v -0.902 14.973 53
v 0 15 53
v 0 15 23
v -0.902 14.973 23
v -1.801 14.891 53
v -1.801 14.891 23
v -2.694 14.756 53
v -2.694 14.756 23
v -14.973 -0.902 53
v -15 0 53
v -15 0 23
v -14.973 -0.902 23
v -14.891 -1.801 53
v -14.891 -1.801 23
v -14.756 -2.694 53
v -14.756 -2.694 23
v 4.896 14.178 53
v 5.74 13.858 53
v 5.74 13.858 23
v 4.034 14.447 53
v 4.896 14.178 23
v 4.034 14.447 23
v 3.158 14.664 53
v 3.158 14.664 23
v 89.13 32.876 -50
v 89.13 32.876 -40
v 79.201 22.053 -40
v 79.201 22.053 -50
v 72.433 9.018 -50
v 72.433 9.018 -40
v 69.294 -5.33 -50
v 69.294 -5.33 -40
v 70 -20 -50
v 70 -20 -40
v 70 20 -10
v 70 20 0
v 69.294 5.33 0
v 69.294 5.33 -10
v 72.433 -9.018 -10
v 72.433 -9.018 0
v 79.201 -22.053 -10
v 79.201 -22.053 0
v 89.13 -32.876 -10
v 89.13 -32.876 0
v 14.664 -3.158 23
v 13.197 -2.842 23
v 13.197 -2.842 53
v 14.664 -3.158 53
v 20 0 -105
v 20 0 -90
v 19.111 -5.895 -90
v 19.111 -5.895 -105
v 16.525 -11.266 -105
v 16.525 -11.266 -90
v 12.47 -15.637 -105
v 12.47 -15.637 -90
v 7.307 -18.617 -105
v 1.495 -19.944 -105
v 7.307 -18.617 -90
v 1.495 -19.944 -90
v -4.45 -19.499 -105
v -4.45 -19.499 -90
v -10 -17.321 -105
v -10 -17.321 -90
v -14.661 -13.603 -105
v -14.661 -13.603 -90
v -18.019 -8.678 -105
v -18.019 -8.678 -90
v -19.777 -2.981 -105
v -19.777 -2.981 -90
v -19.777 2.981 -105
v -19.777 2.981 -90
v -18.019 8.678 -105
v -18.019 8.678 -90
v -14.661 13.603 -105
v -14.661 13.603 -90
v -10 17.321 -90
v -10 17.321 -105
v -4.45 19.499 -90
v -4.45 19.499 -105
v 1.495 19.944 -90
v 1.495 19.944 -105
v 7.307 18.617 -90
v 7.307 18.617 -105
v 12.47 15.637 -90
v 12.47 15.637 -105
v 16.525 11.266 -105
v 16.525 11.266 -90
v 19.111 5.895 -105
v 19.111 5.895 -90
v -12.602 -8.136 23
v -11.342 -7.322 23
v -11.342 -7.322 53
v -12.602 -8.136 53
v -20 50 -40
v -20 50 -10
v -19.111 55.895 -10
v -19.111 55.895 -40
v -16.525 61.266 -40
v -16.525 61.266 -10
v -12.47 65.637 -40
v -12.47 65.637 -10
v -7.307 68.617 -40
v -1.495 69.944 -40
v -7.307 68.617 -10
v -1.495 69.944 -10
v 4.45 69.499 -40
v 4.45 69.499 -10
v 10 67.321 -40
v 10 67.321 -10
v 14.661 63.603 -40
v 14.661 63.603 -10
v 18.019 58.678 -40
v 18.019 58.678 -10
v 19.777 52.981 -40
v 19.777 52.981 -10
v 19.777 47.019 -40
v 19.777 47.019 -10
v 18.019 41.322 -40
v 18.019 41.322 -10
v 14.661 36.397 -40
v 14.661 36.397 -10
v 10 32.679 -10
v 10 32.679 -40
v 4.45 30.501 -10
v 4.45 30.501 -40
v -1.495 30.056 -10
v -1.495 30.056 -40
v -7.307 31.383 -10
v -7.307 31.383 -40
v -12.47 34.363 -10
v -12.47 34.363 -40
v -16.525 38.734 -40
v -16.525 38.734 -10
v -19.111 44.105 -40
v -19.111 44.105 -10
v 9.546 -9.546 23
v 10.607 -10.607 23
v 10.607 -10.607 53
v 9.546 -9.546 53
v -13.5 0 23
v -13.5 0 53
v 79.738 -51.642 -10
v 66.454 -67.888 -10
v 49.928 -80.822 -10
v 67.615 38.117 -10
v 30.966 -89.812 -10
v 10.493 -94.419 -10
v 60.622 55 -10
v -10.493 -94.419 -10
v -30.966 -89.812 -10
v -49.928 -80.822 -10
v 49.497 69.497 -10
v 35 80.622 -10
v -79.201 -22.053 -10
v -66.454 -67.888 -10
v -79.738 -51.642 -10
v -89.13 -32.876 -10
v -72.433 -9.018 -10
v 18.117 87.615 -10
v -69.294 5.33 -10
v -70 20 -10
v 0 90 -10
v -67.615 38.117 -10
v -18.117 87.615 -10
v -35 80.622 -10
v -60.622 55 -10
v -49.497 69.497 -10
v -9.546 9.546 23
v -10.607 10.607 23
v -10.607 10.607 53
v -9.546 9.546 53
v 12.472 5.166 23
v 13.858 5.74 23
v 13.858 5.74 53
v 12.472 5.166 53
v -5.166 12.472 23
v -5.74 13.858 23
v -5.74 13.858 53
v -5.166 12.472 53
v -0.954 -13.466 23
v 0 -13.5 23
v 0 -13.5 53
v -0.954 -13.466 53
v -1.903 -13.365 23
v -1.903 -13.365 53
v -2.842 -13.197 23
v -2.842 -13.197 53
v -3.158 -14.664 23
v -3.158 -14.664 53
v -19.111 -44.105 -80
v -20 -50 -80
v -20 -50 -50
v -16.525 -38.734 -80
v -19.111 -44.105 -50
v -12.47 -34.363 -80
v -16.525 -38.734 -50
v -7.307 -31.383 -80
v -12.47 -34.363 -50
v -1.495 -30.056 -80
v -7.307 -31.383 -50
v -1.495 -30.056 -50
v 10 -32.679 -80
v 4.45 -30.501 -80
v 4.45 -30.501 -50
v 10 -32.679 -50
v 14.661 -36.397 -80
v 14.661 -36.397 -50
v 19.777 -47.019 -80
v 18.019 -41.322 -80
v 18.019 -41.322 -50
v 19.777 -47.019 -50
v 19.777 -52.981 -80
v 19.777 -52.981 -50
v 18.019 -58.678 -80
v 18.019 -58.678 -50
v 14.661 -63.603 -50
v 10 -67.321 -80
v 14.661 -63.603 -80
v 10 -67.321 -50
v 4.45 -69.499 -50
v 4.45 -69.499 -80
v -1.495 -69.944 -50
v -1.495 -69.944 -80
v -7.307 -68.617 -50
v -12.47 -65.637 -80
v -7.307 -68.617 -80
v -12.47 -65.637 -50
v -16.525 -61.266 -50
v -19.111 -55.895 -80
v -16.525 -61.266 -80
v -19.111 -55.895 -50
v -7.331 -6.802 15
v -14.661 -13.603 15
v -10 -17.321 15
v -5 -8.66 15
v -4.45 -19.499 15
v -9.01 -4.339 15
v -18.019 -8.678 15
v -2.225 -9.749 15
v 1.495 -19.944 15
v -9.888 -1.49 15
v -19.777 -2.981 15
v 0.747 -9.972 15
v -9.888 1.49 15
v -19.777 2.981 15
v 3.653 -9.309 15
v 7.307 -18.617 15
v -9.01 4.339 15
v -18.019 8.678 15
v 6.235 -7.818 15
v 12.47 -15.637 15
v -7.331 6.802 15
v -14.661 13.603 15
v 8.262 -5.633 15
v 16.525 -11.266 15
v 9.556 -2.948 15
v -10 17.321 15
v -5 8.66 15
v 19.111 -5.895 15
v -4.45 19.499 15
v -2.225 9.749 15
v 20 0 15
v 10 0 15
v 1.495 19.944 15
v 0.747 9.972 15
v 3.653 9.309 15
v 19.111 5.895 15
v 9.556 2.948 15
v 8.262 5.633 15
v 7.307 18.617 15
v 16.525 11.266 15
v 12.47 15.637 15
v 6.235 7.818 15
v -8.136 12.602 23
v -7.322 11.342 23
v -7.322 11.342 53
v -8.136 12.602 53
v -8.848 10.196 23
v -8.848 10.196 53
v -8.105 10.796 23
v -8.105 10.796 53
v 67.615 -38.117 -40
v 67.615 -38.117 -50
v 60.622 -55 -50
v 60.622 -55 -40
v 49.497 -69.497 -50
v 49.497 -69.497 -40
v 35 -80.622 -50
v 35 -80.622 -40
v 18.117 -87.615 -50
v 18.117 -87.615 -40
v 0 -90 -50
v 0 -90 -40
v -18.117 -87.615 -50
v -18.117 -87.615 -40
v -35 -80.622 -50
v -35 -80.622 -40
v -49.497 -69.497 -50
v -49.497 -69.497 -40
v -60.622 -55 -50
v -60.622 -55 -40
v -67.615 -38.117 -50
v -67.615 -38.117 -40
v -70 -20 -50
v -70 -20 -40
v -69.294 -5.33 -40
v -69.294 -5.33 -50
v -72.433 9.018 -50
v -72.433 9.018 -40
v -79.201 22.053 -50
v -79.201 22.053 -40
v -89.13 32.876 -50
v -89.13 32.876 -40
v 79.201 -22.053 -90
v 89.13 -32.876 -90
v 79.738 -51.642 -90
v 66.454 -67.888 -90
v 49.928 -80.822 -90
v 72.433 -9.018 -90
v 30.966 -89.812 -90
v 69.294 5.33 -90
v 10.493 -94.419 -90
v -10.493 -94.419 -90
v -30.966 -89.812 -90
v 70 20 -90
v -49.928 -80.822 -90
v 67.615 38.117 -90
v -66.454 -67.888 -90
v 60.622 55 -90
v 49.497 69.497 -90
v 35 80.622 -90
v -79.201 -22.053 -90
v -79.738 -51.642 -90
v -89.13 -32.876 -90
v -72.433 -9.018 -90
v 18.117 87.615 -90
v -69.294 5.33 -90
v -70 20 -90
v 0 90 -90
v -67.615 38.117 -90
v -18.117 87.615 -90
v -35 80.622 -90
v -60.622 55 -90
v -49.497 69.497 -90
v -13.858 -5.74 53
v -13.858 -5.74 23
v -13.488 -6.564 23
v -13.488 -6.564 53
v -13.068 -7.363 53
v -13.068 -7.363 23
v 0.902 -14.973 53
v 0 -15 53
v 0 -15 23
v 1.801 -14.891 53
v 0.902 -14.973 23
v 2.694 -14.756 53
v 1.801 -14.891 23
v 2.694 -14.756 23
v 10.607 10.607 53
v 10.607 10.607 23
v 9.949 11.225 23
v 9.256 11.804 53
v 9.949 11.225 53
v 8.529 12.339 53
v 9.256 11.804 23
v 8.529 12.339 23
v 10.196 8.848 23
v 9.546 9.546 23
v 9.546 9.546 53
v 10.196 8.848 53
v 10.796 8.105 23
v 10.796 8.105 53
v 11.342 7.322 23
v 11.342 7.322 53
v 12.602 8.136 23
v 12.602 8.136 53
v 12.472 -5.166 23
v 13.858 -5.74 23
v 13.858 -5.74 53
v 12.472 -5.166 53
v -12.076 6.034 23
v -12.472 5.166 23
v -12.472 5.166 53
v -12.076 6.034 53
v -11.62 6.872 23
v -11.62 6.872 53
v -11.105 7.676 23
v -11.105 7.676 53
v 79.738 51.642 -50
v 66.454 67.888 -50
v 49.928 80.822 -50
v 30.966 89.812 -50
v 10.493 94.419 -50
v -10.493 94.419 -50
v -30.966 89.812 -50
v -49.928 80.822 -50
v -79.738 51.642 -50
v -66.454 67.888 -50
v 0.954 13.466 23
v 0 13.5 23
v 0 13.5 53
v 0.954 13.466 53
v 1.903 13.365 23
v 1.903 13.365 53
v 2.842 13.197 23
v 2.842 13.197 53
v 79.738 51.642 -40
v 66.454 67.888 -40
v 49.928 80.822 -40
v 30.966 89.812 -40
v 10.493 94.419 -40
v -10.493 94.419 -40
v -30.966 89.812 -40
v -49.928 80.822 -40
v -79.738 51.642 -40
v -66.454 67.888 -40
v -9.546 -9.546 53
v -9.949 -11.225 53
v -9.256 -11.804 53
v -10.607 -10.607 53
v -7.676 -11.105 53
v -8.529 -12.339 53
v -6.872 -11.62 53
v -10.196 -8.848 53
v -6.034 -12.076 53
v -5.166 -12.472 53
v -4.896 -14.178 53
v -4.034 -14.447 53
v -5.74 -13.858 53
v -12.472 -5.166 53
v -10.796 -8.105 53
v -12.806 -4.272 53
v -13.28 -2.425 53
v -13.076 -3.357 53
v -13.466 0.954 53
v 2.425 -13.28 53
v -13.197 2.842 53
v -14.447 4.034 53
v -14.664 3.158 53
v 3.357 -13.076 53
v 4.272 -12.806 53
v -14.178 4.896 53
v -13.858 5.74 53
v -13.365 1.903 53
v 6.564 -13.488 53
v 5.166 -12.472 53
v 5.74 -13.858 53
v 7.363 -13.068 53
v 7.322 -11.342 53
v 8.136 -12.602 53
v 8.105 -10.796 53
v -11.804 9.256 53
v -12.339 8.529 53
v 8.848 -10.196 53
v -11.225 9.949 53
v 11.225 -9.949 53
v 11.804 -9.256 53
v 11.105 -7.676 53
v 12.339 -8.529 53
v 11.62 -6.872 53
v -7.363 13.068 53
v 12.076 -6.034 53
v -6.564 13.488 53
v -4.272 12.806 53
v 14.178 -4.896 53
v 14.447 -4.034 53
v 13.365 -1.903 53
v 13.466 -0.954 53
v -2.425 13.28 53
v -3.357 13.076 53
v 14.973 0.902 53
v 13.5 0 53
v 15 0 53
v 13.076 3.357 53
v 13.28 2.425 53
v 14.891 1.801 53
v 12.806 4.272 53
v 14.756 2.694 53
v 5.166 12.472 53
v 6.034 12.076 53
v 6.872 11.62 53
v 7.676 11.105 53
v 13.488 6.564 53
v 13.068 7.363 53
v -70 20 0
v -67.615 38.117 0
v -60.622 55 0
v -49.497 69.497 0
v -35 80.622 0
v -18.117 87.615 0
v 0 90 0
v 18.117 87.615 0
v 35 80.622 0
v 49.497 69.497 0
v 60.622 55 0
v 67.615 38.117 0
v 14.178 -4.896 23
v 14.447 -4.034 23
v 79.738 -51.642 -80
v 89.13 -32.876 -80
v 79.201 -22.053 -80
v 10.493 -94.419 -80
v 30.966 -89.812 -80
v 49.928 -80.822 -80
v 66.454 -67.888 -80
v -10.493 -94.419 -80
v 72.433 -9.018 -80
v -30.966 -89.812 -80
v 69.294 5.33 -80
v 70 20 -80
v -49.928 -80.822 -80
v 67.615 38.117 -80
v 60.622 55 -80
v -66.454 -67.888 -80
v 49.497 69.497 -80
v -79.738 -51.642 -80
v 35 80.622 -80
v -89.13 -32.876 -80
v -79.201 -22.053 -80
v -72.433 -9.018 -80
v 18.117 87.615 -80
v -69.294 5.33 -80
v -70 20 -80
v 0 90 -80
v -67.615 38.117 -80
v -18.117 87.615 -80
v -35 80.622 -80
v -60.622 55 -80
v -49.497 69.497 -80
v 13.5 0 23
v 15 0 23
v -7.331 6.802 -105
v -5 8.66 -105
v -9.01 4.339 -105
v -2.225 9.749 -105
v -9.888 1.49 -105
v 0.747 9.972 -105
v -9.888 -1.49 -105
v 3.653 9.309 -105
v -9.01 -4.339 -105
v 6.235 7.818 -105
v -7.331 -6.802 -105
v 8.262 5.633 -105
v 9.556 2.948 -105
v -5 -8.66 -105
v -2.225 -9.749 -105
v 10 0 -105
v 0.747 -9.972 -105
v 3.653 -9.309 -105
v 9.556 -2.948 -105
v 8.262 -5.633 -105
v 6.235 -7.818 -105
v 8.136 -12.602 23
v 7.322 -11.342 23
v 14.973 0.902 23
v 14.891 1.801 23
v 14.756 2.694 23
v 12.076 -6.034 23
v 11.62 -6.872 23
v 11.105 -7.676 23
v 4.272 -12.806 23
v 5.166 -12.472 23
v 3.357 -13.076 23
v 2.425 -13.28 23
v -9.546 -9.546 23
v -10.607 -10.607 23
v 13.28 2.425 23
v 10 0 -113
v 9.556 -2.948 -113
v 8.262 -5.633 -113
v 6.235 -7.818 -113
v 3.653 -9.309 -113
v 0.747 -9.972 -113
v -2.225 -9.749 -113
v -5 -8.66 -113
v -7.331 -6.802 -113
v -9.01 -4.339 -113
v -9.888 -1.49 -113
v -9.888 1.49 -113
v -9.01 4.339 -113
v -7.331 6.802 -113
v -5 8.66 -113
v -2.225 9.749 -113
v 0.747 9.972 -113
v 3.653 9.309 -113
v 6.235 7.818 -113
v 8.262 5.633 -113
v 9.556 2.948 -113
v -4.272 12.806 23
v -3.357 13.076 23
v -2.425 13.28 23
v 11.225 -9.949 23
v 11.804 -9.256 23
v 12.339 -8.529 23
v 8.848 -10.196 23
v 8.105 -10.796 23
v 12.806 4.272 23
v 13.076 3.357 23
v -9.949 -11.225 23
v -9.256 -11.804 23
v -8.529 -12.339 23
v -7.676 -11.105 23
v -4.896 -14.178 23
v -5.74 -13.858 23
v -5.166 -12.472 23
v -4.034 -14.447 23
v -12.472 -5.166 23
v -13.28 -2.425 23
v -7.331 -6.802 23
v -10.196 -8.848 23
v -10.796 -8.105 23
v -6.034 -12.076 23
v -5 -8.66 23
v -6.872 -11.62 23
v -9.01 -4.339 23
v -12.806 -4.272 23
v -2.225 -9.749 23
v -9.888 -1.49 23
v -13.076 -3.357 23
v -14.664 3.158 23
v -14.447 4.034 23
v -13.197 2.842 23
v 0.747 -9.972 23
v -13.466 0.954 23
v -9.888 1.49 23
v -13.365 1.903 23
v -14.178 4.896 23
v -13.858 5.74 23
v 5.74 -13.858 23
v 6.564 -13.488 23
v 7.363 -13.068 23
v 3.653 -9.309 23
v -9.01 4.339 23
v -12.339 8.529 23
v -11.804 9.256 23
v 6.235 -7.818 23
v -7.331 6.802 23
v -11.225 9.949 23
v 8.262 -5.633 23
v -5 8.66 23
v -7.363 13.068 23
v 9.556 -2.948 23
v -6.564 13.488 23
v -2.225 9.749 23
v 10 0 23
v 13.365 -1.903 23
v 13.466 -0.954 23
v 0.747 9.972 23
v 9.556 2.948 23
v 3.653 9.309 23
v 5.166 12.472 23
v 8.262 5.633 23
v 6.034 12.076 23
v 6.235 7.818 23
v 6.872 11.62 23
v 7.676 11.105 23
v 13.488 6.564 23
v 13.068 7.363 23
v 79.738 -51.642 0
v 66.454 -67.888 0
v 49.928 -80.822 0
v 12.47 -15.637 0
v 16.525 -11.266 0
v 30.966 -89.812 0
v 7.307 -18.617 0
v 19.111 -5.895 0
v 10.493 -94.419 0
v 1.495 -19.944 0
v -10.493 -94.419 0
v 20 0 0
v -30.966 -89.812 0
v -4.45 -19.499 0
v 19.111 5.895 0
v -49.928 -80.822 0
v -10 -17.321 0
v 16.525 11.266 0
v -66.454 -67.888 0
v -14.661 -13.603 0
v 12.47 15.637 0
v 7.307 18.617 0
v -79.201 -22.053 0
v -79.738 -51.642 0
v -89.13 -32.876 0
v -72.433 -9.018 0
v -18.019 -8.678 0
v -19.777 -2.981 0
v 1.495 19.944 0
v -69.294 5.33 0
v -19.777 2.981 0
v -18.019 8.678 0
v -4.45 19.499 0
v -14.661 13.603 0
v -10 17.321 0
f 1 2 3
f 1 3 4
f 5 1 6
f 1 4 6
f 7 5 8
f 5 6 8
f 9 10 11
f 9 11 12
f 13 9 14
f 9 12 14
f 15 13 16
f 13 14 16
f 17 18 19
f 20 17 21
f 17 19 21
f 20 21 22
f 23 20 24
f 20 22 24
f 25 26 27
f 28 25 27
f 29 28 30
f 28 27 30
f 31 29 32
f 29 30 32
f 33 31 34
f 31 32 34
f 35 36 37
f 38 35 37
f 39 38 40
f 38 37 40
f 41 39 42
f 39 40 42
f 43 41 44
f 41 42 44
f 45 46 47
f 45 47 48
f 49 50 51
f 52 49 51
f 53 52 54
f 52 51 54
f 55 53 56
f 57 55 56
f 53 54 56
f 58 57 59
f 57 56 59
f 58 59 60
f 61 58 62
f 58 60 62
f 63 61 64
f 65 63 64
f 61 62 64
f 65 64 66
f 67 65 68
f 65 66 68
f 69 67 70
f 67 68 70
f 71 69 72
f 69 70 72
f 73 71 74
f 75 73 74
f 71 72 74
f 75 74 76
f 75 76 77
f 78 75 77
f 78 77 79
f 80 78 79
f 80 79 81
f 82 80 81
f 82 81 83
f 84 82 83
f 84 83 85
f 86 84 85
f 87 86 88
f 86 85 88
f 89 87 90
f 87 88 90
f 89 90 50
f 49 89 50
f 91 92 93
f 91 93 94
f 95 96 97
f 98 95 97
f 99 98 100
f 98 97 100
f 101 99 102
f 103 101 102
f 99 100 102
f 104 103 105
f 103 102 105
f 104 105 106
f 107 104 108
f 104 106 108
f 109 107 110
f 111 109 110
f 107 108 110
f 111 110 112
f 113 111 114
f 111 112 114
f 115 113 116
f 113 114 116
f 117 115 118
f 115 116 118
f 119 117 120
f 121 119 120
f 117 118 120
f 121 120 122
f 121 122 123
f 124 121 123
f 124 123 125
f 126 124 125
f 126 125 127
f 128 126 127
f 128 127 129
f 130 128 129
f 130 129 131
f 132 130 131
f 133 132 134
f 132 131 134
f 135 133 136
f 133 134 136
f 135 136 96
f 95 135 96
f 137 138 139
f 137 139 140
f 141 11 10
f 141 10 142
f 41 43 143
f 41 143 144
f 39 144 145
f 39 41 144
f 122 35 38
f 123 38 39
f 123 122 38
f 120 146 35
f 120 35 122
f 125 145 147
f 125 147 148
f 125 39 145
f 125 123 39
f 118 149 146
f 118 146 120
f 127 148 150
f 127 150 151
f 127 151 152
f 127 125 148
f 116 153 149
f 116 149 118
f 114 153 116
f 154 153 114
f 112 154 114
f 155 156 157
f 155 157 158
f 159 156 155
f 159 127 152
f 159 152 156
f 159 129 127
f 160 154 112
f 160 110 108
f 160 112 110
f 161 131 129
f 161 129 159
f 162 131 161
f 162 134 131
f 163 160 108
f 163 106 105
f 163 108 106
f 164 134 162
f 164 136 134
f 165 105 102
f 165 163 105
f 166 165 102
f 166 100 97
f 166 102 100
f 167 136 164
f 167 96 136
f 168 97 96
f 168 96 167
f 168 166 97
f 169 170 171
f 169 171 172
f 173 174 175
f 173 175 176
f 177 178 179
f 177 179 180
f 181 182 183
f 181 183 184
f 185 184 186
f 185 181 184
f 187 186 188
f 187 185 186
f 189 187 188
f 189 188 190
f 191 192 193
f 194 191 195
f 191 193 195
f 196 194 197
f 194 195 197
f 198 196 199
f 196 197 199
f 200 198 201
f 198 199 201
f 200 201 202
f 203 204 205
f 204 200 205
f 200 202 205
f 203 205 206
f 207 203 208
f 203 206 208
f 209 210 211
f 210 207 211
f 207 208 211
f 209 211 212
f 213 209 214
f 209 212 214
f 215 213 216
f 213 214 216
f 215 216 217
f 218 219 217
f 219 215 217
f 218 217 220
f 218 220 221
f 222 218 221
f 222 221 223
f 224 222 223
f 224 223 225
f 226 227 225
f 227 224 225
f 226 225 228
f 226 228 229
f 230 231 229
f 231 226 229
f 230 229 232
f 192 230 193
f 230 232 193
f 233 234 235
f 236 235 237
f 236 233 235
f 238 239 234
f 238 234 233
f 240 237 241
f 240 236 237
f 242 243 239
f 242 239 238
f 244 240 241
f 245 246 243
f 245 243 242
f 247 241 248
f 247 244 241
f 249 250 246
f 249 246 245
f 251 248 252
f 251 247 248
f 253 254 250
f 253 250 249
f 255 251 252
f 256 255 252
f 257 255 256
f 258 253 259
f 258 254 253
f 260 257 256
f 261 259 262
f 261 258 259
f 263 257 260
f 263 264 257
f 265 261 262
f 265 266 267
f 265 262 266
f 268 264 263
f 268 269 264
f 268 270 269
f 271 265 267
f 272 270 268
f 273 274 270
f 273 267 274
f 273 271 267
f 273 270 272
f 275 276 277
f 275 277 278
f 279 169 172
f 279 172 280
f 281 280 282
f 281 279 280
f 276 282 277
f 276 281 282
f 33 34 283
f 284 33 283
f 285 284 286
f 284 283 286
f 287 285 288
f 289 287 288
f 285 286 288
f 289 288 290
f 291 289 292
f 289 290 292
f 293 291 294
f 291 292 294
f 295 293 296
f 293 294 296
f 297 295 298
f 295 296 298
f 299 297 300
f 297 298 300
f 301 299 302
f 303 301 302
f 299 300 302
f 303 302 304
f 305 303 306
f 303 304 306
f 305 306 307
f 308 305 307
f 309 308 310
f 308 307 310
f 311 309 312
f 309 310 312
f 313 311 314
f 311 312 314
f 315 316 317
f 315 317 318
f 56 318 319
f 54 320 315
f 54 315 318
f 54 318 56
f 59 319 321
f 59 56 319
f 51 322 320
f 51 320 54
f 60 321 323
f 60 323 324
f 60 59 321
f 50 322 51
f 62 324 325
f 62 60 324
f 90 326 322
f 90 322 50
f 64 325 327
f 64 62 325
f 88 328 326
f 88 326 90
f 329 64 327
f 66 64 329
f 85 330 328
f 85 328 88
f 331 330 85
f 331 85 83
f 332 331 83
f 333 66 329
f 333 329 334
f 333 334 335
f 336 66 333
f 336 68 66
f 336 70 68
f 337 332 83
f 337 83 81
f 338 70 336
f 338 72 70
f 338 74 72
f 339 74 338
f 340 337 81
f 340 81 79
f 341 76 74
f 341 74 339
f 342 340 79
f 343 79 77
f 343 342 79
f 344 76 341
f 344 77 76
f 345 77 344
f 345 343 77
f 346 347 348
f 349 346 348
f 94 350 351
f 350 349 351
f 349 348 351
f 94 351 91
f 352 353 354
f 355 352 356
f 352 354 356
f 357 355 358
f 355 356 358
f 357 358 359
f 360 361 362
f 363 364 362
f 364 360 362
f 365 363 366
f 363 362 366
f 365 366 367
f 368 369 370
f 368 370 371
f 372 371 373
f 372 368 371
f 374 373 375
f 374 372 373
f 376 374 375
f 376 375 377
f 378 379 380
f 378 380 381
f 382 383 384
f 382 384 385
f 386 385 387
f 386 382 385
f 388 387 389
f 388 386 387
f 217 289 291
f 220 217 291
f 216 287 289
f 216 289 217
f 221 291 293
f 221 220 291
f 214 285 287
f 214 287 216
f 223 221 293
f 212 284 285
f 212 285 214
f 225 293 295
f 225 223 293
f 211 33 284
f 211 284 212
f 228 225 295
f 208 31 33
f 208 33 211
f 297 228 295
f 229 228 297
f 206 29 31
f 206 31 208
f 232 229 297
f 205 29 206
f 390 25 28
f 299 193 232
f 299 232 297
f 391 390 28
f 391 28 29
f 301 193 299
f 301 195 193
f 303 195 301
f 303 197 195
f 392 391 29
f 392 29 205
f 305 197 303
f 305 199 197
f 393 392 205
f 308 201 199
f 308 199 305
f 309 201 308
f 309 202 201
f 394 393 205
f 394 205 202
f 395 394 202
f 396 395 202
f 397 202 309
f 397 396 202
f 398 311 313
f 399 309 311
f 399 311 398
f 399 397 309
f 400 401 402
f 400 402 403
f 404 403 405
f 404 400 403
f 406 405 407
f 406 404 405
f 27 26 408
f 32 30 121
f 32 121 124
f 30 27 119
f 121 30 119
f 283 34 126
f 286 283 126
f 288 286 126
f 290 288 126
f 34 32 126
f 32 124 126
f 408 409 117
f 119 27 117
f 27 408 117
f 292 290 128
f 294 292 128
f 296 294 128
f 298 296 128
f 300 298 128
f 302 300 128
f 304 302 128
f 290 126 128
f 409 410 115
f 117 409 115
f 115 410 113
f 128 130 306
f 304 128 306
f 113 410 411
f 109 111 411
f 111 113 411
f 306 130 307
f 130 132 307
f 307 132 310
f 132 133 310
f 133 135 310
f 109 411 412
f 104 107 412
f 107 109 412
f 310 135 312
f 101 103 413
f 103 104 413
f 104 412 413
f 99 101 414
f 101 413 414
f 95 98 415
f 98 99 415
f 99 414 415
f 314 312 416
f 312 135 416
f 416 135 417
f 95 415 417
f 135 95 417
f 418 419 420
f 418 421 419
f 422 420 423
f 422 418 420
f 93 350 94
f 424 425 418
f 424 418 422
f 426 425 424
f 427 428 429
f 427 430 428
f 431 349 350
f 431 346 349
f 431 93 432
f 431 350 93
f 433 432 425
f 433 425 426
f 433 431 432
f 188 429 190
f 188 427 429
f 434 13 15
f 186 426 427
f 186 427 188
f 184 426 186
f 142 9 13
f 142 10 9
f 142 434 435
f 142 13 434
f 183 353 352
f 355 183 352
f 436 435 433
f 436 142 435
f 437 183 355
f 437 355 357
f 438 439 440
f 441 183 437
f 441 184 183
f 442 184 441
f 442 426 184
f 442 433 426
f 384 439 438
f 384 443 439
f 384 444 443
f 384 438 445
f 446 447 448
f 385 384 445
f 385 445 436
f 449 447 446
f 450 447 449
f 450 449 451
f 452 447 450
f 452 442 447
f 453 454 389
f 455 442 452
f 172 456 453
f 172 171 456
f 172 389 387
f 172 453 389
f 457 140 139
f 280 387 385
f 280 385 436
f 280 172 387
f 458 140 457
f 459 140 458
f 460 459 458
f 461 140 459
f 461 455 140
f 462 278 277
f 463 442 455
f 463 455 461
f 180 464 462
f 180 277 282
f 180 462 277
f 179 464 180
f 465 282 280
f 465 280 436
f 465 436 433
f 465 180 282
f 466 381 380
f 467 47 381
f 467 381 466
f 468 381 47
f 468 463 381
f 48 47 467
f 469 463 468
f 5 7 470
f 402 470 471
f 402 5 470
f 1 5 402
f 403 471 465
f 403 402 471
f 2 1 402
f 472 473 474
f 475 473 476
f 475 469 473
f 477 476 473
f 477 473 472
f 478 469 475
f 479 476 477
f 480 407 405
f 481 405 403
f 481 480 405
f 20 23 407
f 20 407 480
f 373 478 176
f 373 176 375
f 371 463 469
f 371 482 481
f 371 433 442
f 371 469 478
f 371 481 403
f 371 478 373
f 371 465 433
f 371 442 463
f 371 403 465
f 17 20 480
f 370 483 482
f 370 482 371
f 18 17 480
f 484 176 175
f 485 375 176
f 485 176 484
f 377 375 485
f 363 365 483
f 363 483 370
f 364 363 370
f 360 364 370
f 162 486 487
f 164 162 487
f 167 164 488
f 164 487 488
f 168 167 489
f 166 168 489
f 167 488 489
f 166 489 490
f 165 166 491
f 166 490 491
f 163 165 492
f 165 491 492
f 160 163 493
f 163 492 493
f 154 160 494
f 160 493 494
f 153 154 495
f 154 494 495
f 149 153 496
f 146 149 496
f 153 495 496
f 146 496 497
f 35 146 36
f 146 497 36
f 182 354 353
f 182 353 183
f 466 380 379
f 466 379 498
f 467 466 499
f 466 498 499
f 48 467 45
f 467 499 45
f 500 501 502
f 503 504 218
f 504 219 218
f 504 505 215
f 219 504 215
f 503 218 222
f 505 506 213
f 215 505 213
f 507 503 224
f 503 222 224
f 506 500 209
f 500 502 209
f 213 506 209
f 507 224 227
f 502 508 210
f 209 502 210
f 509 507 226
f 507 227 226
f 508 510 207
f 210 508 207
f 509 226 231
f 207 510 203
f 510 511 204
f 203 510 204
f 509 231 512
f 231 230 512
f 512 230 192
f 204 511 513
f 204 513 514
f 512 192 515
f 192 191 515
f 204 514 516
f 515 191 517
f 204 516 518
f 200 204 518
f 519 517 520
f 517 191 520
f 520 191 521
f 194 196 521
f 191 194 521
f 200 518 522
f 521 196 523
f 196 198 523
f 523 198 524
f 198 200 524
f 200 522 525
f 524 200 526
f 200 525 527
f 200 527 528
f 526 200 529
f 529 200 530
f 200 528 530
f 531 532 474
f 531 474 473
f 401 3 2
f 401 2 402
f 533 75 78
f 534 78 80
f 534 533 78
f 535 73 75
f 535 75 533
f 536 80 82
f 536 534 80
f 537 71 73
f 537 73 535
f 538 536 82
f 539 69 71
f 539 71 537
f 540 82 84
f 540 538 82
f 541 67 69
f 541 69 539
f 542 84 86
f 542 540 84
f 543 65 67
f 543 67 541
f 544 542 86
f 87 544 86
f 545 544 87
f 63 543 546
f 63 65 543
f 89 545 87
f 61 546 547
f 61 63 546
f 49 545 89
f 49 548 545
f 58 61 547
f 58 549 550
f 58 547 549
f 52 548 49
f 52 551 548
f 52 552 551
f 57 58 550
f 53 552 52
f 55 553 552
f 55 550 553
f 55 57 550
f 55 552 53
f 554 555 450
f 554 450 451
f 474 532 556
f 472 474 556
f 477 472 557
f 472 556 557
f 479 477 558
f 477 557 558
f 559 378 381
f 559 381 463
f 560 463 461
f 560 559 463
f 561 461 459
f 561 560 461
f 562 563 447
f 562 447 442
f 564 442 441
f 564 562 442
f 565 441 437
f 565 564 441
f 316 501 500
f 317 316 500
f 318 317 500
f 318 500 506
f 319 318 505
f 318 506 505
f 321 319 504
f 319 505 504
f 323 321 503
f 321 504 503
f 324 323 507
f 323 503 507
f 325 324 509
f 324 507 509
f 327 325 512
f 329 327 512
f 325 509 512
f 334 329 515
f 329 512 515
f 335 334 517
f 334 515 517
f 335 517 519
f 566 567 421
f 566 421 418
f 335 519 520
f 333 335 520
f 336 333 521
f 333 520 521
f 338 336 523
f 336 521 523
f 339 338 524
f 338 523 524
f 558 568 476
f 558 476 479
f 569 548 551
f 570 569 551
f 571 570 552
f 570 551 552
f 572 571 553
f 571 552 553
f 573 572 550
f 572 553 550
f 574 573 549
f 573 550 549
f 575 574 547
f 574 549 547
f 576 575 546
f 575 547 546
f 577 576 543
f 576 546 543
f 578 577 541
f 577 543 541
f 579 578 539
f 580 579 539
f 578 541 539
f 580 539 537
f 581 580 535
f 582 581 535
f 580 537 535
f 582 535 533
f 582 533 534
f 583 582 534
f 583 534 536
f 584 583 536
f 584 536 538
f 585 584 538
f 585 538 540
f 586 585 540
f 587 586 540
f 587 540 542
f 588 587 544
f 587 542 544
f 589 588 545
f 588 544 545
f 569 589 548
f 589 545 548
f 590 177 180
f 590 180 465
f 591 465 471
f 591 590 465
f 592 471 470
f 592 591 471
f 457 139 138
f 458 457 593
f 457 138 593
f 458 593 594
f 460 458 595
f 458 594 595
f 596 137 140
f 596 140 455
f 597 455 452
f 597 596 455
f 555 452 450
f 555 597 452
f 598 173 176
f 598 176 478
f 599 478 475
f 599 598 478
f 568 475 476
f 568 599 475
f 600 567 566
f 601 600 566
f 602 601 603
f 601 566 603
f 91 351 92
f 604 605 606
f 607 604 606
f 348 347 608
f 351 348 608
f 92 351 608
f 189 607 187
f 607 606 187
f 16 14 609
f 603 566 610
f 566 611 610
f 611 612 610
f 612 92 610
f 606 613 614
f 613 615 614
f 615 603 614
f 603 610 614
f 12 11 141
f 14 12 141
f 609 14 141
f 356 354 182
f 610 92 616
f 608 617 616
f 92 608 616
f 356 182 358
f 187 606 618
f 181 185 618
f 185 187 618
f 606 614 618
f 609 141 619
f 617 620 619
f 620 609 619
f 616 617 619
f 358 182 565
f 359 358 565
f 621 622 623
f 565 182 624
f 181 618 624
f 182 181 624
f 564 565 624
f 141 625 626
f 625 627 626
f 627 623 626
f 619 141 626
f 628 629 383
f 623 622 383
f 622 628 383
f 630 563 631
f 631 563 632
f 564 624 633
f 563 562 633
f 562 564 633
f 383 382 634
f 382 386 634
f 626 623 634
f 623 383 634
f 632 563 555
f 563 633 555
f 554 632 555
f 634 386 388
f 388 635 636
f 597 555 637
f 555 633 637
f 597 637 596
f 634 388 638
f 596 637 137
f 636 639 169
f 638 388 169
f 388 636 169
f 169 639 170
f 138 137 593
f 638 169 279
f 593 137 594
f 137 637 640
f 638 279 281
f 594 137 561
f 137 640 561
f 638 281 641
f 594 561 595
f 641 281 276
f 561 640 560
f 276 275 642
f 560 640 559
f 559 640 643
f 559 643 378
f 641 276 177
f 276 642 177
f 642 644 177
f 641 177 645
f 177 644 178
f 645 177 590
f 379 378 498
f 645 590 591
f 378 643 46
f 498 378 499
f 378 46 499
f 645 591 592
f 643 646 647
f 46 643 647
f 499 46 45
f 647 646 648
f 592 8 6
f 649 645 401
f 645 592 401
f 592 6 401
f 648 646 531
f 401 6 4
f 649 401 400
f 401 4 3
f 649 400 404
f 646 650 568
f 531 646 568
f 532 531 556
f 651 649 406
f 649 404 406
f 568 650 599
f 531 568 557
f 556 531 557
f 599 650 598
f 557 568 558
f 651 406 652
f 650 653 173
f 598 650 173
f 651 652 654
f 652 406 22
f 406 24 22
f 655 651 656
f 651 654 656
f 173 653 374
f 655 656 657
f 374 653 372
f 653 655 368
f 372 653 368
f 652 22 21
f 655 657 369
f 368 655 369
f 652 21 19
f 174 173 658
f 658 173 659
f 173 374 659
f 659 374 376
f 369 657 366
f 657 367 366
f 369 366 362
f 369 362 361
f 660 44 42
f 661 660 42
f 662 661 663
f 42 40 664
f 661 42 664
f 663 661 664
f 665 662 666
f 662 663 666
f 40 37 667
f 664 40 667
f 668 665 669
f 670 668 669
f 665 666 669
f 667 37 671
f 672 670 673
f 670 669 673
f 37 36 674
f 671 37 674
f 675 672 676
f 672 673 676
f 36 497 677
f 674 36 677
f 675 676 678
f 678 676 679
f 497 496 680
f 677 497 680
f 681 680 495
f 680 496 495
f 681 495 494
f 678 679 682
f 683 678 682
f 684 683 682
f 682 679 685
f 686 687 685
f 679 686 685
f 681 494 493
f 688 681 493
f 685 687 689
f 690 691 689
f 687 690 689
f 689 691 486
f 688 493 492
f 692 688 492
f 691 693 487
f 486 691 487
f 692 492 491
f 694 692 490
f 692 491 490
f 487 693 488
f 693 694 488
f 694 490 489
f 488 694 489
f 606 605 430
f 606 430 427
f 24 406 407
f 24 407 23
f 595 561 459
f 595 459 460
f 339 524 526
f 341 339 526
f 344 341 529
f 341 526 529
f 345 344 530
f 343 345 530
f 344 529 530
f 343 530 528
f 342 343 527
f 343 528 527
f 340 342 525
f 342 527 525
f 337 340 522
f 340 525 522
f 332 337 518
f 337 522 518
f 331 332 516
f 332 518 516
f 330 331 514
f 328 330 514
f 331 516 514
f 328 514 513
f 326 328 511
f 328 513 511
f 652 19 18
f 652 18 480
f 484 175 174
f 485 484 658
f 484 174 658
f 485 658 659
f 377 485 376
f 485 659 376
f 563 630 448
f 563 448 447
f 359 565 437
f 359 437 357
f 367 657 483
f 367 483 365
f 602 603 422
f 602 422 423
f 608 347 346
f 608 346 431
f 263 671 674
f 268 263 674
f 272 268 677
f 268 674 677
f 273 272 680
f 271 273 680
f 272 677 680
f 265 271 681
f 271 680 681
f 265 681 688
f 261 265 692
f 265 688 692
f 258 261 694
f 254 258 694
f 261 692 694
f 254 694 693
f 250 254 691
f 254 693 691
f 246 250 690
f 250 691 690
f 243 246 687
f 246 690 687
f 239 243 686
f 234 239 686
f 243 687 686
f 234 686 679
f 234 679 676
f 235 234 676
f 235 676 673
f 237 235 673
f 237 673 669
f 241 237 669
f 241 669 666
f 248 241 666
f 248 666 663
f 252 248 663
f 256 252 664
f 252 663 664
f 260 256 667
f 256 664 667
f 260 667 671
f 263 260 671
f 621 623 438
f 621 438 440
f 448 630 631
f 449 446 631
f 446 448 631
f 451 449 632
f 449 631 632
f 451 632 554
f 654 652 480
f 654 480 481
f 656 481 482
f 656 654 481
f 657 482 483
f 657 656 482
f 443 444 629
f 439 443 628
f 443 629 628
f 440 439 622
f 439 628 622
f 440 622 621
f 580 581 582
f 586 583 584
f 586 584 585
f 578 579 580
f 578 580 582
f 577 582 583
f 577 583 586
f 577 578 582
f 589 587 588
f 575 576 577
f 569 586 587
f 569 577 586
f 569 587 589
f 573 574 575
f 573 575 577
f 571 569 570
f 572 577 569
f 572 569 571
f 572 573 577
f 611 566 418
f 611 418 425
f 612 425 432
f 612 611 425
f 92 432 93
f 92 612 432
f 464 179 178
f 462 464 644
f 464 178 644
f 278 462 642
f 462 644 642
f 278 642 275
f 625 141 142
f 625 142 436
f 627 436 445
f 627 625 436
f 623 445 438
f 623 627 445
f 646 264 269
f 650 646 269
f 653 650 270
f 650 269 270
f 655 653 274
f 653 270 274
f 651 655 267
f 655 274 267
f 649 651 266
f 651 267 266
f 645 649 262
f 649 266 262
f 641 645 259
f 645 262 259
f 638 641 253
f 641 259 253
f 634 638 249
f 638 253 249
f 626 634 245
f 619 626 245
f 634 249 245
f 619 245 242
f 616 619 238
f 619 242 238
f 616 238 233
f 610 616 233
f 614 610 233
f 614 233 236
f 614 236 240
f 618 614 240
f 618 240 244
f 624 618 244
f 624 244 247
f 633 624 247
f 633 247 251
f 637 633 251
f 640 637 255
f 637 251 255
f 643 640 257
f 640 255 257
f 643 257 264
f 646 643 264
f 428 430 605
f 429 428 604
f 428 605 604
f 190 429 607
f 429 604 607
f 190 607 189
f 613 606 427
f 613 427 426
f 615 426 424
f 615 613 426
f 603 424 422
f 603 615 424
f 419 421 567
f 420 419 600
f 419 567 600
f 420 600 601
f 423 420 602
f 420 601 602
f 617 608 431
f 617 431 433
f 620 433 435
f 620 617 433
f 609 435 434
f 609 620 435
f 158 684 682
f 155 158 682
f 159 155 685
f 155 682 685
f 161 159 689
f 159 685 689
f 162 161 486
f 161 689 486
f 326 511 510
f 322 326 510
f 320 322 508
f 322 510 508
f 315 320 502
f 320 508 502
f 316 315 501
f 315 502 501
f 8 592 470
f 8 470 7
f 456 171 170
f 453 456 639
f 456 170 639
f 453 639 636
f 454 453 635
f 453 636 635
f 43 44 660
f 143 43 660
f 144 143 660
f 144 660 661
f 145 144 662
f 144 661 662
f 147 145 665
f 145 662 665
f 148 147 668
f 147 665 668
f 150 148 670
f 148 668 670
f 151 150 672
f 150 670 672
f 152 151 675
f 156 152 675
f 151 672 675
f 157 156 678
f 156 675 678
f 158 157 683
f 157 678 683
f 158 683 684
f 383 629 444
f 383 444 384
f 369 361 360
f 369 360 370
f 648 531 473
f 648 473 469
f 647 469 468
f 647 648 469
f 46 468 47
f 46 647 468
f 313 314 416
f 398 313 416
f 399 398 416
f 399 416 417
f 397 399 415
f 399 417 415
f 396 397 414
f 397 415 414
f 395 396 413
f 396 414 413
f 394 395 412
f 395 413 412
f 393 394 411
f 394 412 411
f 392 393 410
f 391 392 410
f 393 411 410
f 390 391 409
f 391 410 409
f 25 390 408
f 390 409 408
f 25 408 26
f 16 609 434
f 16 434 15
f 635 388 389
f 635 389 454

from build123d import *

# Parameters (mm, degrees)
SKETCH1_R            = 20
BOSS_EXTRUDE1_DEPTH  = 15
SKETCH2_R            = 10
BOSS_EXTRUDE2_DEPTH  = 8
SKETCH3_R            = 15
BOSS_EXTRUDE3_DEPTH  = 30
CUT_EXTRUDE1_START   = -30
CUT_EXTRUDE1_DEPTH   = 30
CIRPATTERN1_COUNT    = 16
BOSS_EXTRUDE5_DEPTH  = 10
SKETCH9_R            = 20
BOSS_EXTRUDE6_DEPTH  = 30
BOSS_EXTRUDE7_DEPTH  = 10
BOSS_EXTRUDE8_DEPTH  = 10
BOSS_EXTRUDE9_REACH  = 168.067
SKETCH14_R           = 20
SKETCH15_R           = 20
BOSS_EXTRUDE10_DEPTH = 15
SKETCH16_R           = 10
BOSS_EXTRUDE11_DEPTH = 8


with BuildPart() as part:
    # Sketch1 → Boss-Extrude1 (new body)
    with BuildSketch(Plane.XY):
        Circle(SKETCH1_R)
    extrude(amount=BOSS_EXTRUDE1_DEPTH)

    # Sketch2 → Boss-Extrude2 (add)
    with BuildSketch(Plane.XY.offset(15)):
        Circle(SKETCH2_R)
    extrude(amount=BOSS_EXTRUDE2_DEPTH)

    # Sketch3 → Boss-Extrude3 (add)
    with BuildSketch(Plane.XY.offset(23)):
        Circle(SKETCH3_R)
    extrude(amount=BOSS_EXTRUDE3_DEPTH)

    # Sketch5 → Cut-Extrude1 (cut)
    with BuildSketch(Plane.XY.offset(53).offset(CUT_EXTRUDE1_START)):
        with BuildLine():
            ThreePointArc((3.157894737, 14.663822859), (1.587869189, 14.915718938), (0, 15))
            Line((0, 15), (0, 13.5))
            ThreePointArc((0, 13.5), (1.42908227, 13.424147044), (2.842105263, 13.197440573))
            Line((2.842105263, 13.197440573), (3.157894737, 14.663822859))
        make_face()
    cut_extrude1 = extrude(amount=CUT_EXTRUDE1_DEPTH, mode=Mode.SUBTRACT)

    # CirPattern1: Cut-Extrude1 ×16 about axis
    cirpattern1_axis = Axis((0, 0, 0), (0, 0, 1))
    for i in range(1, CIRPATTERN1_COUNT):
        add(cut_extrude1.rotate(cirpattern1_axis, i * 360 / CIRPATTERN1_COUNT), mode=Mode.SUBTRACT)

    # Sketch8 → Boss-Extrude5 (add)
    with BuildSketch(Plane(origin=(0, 0, 0), x_dir=(-1, 0, 0), z_dir=(0, 0, -1))):
        with BuildLine():
            ThreePointArc((70, 20), (0, 90), (-70, 20))
            ThreePointArc((-70, 20), (-72.432874235, -9.018340852), (-89.130077464, -32.875968295))
            ThreePointArc((-89.130077464, -32.875968295), (0, -95), (89.130077464, -32.875968295))
            ThreePointArc((89.130077464, -32.875968295), (72.432874235, -9.018340852), (70, 20))
        make_face()
    extrude(amount=BOSS_EXTRUDE5_DEPTH)

    # Sketch9 → Boss-Extrude6 (add)
    with BuildSketch(Plane(origin=(0, 0, -10), x_dir=(-1, 0, 0), z_dir=(0, 0, -1))):
        with Locations((0, 50)):
            Circle(SKETCH9_R)
    extrude(amount=BOSS_EXTRUDE6_DEPTH)

    # Sketch10 → Boss-Extrude7 (add)
    with BuildSketch(Plane(origin=(0, 0, -40), x_dir=(-1, 0, 0), z_dir=(0, 0, -1))):
        with BuildLine():
            ThreePointArc((-70, -20), (0, -90), (70, -20))
            ThreePointArc((70, -20), (72.432874235, 9.018340852), (89.130077464, 32.875968295))
            ThreePointArc((89.130077464, 32.875968295), (0, 95), (-89.130077464, 32.875968295))
            ThreePointArc((-89.130077464, 32.875968295), (-72.432874235, 9.018340852), (-70, -20))
        make_face()
    extrude(amount=BOSS_EXTRUDE7_DEPTH)


with BuildPart() as body_2:
    # Sketch12 → Boss-Extrude8 (new body)
    with BuildSketch(Plane(origin=(0, 0, -80), x_dir=(-1, 0, 0), z_dir=(0, 0, -1))):
        with BuildLine():
            ThreePointArc((70, 20), (0, 90), (-70, 20))
            ThreePointArc((-70, 20), (-72.432874235, -9.018340852), (-89.130077464, -32.875968295))
            ThreePointArc((-89.130077464, -32.875968295), (0, -95), (89.130077464, -32.875968295))
            ThreePointArc((89.130077464, -32.875968295), (72.432874235, -9.018340852), (70, 20))
        make_face()
    extrude(amount=BOSS_EXTRUDE8_DEPTH)

    # Sketch14 → Boss-Extrude9 (add, up to next)
    with BuildSketch(Plane(origin=(0, 0, -50), x_dir=(-1, 0, 0), z_dir=(0, 0, -1)), mode=Mode.PRIVATE) as boss_extrude9_sk1:
        with Locations((0, -50)):
            Circle(SKETCH14_R)
    boss_extrude9_tool1 = extrude(boss_extrude9_sk1.sketch, amount=BOSS_EXTRUDE9_REACH, mode=Mode.PRIVATE) - body_2.part

    add(part.part)  # Boss-Extrude9 merges part
    add(boss_extrude9_tool1.solids().sort_by_distance((0, -50, -50))[0])

    # Sketch15 → Boss-Extrude10 (add)
    with BuildSketch(Plane(origin=(0, 0, -90), x_dir=(-1, 0, 0), z_dir=(0, 0, -1))):
        with Locations(Location((0, 0, 0), (0, 0, 180))):
            Circle(SKETCH15_R)
    extrude(amount=BOSS_EXTRUDE10_DEPTH)

    # Sketch16 → Boss-Extrude11 (add)
    with BuildSketch(Plane(origin=(0, 0, -105), x_dir=(-1, 0, 0), z_dir=(0, 0, -1))):
        with Locations(Location((0, 0, 0), (0, 0, 180))):
            Circle(SKETCH16_R)
    extrude(amount=BOSS_EXTRUDE11_DEPTH)


solid = body_2.part
